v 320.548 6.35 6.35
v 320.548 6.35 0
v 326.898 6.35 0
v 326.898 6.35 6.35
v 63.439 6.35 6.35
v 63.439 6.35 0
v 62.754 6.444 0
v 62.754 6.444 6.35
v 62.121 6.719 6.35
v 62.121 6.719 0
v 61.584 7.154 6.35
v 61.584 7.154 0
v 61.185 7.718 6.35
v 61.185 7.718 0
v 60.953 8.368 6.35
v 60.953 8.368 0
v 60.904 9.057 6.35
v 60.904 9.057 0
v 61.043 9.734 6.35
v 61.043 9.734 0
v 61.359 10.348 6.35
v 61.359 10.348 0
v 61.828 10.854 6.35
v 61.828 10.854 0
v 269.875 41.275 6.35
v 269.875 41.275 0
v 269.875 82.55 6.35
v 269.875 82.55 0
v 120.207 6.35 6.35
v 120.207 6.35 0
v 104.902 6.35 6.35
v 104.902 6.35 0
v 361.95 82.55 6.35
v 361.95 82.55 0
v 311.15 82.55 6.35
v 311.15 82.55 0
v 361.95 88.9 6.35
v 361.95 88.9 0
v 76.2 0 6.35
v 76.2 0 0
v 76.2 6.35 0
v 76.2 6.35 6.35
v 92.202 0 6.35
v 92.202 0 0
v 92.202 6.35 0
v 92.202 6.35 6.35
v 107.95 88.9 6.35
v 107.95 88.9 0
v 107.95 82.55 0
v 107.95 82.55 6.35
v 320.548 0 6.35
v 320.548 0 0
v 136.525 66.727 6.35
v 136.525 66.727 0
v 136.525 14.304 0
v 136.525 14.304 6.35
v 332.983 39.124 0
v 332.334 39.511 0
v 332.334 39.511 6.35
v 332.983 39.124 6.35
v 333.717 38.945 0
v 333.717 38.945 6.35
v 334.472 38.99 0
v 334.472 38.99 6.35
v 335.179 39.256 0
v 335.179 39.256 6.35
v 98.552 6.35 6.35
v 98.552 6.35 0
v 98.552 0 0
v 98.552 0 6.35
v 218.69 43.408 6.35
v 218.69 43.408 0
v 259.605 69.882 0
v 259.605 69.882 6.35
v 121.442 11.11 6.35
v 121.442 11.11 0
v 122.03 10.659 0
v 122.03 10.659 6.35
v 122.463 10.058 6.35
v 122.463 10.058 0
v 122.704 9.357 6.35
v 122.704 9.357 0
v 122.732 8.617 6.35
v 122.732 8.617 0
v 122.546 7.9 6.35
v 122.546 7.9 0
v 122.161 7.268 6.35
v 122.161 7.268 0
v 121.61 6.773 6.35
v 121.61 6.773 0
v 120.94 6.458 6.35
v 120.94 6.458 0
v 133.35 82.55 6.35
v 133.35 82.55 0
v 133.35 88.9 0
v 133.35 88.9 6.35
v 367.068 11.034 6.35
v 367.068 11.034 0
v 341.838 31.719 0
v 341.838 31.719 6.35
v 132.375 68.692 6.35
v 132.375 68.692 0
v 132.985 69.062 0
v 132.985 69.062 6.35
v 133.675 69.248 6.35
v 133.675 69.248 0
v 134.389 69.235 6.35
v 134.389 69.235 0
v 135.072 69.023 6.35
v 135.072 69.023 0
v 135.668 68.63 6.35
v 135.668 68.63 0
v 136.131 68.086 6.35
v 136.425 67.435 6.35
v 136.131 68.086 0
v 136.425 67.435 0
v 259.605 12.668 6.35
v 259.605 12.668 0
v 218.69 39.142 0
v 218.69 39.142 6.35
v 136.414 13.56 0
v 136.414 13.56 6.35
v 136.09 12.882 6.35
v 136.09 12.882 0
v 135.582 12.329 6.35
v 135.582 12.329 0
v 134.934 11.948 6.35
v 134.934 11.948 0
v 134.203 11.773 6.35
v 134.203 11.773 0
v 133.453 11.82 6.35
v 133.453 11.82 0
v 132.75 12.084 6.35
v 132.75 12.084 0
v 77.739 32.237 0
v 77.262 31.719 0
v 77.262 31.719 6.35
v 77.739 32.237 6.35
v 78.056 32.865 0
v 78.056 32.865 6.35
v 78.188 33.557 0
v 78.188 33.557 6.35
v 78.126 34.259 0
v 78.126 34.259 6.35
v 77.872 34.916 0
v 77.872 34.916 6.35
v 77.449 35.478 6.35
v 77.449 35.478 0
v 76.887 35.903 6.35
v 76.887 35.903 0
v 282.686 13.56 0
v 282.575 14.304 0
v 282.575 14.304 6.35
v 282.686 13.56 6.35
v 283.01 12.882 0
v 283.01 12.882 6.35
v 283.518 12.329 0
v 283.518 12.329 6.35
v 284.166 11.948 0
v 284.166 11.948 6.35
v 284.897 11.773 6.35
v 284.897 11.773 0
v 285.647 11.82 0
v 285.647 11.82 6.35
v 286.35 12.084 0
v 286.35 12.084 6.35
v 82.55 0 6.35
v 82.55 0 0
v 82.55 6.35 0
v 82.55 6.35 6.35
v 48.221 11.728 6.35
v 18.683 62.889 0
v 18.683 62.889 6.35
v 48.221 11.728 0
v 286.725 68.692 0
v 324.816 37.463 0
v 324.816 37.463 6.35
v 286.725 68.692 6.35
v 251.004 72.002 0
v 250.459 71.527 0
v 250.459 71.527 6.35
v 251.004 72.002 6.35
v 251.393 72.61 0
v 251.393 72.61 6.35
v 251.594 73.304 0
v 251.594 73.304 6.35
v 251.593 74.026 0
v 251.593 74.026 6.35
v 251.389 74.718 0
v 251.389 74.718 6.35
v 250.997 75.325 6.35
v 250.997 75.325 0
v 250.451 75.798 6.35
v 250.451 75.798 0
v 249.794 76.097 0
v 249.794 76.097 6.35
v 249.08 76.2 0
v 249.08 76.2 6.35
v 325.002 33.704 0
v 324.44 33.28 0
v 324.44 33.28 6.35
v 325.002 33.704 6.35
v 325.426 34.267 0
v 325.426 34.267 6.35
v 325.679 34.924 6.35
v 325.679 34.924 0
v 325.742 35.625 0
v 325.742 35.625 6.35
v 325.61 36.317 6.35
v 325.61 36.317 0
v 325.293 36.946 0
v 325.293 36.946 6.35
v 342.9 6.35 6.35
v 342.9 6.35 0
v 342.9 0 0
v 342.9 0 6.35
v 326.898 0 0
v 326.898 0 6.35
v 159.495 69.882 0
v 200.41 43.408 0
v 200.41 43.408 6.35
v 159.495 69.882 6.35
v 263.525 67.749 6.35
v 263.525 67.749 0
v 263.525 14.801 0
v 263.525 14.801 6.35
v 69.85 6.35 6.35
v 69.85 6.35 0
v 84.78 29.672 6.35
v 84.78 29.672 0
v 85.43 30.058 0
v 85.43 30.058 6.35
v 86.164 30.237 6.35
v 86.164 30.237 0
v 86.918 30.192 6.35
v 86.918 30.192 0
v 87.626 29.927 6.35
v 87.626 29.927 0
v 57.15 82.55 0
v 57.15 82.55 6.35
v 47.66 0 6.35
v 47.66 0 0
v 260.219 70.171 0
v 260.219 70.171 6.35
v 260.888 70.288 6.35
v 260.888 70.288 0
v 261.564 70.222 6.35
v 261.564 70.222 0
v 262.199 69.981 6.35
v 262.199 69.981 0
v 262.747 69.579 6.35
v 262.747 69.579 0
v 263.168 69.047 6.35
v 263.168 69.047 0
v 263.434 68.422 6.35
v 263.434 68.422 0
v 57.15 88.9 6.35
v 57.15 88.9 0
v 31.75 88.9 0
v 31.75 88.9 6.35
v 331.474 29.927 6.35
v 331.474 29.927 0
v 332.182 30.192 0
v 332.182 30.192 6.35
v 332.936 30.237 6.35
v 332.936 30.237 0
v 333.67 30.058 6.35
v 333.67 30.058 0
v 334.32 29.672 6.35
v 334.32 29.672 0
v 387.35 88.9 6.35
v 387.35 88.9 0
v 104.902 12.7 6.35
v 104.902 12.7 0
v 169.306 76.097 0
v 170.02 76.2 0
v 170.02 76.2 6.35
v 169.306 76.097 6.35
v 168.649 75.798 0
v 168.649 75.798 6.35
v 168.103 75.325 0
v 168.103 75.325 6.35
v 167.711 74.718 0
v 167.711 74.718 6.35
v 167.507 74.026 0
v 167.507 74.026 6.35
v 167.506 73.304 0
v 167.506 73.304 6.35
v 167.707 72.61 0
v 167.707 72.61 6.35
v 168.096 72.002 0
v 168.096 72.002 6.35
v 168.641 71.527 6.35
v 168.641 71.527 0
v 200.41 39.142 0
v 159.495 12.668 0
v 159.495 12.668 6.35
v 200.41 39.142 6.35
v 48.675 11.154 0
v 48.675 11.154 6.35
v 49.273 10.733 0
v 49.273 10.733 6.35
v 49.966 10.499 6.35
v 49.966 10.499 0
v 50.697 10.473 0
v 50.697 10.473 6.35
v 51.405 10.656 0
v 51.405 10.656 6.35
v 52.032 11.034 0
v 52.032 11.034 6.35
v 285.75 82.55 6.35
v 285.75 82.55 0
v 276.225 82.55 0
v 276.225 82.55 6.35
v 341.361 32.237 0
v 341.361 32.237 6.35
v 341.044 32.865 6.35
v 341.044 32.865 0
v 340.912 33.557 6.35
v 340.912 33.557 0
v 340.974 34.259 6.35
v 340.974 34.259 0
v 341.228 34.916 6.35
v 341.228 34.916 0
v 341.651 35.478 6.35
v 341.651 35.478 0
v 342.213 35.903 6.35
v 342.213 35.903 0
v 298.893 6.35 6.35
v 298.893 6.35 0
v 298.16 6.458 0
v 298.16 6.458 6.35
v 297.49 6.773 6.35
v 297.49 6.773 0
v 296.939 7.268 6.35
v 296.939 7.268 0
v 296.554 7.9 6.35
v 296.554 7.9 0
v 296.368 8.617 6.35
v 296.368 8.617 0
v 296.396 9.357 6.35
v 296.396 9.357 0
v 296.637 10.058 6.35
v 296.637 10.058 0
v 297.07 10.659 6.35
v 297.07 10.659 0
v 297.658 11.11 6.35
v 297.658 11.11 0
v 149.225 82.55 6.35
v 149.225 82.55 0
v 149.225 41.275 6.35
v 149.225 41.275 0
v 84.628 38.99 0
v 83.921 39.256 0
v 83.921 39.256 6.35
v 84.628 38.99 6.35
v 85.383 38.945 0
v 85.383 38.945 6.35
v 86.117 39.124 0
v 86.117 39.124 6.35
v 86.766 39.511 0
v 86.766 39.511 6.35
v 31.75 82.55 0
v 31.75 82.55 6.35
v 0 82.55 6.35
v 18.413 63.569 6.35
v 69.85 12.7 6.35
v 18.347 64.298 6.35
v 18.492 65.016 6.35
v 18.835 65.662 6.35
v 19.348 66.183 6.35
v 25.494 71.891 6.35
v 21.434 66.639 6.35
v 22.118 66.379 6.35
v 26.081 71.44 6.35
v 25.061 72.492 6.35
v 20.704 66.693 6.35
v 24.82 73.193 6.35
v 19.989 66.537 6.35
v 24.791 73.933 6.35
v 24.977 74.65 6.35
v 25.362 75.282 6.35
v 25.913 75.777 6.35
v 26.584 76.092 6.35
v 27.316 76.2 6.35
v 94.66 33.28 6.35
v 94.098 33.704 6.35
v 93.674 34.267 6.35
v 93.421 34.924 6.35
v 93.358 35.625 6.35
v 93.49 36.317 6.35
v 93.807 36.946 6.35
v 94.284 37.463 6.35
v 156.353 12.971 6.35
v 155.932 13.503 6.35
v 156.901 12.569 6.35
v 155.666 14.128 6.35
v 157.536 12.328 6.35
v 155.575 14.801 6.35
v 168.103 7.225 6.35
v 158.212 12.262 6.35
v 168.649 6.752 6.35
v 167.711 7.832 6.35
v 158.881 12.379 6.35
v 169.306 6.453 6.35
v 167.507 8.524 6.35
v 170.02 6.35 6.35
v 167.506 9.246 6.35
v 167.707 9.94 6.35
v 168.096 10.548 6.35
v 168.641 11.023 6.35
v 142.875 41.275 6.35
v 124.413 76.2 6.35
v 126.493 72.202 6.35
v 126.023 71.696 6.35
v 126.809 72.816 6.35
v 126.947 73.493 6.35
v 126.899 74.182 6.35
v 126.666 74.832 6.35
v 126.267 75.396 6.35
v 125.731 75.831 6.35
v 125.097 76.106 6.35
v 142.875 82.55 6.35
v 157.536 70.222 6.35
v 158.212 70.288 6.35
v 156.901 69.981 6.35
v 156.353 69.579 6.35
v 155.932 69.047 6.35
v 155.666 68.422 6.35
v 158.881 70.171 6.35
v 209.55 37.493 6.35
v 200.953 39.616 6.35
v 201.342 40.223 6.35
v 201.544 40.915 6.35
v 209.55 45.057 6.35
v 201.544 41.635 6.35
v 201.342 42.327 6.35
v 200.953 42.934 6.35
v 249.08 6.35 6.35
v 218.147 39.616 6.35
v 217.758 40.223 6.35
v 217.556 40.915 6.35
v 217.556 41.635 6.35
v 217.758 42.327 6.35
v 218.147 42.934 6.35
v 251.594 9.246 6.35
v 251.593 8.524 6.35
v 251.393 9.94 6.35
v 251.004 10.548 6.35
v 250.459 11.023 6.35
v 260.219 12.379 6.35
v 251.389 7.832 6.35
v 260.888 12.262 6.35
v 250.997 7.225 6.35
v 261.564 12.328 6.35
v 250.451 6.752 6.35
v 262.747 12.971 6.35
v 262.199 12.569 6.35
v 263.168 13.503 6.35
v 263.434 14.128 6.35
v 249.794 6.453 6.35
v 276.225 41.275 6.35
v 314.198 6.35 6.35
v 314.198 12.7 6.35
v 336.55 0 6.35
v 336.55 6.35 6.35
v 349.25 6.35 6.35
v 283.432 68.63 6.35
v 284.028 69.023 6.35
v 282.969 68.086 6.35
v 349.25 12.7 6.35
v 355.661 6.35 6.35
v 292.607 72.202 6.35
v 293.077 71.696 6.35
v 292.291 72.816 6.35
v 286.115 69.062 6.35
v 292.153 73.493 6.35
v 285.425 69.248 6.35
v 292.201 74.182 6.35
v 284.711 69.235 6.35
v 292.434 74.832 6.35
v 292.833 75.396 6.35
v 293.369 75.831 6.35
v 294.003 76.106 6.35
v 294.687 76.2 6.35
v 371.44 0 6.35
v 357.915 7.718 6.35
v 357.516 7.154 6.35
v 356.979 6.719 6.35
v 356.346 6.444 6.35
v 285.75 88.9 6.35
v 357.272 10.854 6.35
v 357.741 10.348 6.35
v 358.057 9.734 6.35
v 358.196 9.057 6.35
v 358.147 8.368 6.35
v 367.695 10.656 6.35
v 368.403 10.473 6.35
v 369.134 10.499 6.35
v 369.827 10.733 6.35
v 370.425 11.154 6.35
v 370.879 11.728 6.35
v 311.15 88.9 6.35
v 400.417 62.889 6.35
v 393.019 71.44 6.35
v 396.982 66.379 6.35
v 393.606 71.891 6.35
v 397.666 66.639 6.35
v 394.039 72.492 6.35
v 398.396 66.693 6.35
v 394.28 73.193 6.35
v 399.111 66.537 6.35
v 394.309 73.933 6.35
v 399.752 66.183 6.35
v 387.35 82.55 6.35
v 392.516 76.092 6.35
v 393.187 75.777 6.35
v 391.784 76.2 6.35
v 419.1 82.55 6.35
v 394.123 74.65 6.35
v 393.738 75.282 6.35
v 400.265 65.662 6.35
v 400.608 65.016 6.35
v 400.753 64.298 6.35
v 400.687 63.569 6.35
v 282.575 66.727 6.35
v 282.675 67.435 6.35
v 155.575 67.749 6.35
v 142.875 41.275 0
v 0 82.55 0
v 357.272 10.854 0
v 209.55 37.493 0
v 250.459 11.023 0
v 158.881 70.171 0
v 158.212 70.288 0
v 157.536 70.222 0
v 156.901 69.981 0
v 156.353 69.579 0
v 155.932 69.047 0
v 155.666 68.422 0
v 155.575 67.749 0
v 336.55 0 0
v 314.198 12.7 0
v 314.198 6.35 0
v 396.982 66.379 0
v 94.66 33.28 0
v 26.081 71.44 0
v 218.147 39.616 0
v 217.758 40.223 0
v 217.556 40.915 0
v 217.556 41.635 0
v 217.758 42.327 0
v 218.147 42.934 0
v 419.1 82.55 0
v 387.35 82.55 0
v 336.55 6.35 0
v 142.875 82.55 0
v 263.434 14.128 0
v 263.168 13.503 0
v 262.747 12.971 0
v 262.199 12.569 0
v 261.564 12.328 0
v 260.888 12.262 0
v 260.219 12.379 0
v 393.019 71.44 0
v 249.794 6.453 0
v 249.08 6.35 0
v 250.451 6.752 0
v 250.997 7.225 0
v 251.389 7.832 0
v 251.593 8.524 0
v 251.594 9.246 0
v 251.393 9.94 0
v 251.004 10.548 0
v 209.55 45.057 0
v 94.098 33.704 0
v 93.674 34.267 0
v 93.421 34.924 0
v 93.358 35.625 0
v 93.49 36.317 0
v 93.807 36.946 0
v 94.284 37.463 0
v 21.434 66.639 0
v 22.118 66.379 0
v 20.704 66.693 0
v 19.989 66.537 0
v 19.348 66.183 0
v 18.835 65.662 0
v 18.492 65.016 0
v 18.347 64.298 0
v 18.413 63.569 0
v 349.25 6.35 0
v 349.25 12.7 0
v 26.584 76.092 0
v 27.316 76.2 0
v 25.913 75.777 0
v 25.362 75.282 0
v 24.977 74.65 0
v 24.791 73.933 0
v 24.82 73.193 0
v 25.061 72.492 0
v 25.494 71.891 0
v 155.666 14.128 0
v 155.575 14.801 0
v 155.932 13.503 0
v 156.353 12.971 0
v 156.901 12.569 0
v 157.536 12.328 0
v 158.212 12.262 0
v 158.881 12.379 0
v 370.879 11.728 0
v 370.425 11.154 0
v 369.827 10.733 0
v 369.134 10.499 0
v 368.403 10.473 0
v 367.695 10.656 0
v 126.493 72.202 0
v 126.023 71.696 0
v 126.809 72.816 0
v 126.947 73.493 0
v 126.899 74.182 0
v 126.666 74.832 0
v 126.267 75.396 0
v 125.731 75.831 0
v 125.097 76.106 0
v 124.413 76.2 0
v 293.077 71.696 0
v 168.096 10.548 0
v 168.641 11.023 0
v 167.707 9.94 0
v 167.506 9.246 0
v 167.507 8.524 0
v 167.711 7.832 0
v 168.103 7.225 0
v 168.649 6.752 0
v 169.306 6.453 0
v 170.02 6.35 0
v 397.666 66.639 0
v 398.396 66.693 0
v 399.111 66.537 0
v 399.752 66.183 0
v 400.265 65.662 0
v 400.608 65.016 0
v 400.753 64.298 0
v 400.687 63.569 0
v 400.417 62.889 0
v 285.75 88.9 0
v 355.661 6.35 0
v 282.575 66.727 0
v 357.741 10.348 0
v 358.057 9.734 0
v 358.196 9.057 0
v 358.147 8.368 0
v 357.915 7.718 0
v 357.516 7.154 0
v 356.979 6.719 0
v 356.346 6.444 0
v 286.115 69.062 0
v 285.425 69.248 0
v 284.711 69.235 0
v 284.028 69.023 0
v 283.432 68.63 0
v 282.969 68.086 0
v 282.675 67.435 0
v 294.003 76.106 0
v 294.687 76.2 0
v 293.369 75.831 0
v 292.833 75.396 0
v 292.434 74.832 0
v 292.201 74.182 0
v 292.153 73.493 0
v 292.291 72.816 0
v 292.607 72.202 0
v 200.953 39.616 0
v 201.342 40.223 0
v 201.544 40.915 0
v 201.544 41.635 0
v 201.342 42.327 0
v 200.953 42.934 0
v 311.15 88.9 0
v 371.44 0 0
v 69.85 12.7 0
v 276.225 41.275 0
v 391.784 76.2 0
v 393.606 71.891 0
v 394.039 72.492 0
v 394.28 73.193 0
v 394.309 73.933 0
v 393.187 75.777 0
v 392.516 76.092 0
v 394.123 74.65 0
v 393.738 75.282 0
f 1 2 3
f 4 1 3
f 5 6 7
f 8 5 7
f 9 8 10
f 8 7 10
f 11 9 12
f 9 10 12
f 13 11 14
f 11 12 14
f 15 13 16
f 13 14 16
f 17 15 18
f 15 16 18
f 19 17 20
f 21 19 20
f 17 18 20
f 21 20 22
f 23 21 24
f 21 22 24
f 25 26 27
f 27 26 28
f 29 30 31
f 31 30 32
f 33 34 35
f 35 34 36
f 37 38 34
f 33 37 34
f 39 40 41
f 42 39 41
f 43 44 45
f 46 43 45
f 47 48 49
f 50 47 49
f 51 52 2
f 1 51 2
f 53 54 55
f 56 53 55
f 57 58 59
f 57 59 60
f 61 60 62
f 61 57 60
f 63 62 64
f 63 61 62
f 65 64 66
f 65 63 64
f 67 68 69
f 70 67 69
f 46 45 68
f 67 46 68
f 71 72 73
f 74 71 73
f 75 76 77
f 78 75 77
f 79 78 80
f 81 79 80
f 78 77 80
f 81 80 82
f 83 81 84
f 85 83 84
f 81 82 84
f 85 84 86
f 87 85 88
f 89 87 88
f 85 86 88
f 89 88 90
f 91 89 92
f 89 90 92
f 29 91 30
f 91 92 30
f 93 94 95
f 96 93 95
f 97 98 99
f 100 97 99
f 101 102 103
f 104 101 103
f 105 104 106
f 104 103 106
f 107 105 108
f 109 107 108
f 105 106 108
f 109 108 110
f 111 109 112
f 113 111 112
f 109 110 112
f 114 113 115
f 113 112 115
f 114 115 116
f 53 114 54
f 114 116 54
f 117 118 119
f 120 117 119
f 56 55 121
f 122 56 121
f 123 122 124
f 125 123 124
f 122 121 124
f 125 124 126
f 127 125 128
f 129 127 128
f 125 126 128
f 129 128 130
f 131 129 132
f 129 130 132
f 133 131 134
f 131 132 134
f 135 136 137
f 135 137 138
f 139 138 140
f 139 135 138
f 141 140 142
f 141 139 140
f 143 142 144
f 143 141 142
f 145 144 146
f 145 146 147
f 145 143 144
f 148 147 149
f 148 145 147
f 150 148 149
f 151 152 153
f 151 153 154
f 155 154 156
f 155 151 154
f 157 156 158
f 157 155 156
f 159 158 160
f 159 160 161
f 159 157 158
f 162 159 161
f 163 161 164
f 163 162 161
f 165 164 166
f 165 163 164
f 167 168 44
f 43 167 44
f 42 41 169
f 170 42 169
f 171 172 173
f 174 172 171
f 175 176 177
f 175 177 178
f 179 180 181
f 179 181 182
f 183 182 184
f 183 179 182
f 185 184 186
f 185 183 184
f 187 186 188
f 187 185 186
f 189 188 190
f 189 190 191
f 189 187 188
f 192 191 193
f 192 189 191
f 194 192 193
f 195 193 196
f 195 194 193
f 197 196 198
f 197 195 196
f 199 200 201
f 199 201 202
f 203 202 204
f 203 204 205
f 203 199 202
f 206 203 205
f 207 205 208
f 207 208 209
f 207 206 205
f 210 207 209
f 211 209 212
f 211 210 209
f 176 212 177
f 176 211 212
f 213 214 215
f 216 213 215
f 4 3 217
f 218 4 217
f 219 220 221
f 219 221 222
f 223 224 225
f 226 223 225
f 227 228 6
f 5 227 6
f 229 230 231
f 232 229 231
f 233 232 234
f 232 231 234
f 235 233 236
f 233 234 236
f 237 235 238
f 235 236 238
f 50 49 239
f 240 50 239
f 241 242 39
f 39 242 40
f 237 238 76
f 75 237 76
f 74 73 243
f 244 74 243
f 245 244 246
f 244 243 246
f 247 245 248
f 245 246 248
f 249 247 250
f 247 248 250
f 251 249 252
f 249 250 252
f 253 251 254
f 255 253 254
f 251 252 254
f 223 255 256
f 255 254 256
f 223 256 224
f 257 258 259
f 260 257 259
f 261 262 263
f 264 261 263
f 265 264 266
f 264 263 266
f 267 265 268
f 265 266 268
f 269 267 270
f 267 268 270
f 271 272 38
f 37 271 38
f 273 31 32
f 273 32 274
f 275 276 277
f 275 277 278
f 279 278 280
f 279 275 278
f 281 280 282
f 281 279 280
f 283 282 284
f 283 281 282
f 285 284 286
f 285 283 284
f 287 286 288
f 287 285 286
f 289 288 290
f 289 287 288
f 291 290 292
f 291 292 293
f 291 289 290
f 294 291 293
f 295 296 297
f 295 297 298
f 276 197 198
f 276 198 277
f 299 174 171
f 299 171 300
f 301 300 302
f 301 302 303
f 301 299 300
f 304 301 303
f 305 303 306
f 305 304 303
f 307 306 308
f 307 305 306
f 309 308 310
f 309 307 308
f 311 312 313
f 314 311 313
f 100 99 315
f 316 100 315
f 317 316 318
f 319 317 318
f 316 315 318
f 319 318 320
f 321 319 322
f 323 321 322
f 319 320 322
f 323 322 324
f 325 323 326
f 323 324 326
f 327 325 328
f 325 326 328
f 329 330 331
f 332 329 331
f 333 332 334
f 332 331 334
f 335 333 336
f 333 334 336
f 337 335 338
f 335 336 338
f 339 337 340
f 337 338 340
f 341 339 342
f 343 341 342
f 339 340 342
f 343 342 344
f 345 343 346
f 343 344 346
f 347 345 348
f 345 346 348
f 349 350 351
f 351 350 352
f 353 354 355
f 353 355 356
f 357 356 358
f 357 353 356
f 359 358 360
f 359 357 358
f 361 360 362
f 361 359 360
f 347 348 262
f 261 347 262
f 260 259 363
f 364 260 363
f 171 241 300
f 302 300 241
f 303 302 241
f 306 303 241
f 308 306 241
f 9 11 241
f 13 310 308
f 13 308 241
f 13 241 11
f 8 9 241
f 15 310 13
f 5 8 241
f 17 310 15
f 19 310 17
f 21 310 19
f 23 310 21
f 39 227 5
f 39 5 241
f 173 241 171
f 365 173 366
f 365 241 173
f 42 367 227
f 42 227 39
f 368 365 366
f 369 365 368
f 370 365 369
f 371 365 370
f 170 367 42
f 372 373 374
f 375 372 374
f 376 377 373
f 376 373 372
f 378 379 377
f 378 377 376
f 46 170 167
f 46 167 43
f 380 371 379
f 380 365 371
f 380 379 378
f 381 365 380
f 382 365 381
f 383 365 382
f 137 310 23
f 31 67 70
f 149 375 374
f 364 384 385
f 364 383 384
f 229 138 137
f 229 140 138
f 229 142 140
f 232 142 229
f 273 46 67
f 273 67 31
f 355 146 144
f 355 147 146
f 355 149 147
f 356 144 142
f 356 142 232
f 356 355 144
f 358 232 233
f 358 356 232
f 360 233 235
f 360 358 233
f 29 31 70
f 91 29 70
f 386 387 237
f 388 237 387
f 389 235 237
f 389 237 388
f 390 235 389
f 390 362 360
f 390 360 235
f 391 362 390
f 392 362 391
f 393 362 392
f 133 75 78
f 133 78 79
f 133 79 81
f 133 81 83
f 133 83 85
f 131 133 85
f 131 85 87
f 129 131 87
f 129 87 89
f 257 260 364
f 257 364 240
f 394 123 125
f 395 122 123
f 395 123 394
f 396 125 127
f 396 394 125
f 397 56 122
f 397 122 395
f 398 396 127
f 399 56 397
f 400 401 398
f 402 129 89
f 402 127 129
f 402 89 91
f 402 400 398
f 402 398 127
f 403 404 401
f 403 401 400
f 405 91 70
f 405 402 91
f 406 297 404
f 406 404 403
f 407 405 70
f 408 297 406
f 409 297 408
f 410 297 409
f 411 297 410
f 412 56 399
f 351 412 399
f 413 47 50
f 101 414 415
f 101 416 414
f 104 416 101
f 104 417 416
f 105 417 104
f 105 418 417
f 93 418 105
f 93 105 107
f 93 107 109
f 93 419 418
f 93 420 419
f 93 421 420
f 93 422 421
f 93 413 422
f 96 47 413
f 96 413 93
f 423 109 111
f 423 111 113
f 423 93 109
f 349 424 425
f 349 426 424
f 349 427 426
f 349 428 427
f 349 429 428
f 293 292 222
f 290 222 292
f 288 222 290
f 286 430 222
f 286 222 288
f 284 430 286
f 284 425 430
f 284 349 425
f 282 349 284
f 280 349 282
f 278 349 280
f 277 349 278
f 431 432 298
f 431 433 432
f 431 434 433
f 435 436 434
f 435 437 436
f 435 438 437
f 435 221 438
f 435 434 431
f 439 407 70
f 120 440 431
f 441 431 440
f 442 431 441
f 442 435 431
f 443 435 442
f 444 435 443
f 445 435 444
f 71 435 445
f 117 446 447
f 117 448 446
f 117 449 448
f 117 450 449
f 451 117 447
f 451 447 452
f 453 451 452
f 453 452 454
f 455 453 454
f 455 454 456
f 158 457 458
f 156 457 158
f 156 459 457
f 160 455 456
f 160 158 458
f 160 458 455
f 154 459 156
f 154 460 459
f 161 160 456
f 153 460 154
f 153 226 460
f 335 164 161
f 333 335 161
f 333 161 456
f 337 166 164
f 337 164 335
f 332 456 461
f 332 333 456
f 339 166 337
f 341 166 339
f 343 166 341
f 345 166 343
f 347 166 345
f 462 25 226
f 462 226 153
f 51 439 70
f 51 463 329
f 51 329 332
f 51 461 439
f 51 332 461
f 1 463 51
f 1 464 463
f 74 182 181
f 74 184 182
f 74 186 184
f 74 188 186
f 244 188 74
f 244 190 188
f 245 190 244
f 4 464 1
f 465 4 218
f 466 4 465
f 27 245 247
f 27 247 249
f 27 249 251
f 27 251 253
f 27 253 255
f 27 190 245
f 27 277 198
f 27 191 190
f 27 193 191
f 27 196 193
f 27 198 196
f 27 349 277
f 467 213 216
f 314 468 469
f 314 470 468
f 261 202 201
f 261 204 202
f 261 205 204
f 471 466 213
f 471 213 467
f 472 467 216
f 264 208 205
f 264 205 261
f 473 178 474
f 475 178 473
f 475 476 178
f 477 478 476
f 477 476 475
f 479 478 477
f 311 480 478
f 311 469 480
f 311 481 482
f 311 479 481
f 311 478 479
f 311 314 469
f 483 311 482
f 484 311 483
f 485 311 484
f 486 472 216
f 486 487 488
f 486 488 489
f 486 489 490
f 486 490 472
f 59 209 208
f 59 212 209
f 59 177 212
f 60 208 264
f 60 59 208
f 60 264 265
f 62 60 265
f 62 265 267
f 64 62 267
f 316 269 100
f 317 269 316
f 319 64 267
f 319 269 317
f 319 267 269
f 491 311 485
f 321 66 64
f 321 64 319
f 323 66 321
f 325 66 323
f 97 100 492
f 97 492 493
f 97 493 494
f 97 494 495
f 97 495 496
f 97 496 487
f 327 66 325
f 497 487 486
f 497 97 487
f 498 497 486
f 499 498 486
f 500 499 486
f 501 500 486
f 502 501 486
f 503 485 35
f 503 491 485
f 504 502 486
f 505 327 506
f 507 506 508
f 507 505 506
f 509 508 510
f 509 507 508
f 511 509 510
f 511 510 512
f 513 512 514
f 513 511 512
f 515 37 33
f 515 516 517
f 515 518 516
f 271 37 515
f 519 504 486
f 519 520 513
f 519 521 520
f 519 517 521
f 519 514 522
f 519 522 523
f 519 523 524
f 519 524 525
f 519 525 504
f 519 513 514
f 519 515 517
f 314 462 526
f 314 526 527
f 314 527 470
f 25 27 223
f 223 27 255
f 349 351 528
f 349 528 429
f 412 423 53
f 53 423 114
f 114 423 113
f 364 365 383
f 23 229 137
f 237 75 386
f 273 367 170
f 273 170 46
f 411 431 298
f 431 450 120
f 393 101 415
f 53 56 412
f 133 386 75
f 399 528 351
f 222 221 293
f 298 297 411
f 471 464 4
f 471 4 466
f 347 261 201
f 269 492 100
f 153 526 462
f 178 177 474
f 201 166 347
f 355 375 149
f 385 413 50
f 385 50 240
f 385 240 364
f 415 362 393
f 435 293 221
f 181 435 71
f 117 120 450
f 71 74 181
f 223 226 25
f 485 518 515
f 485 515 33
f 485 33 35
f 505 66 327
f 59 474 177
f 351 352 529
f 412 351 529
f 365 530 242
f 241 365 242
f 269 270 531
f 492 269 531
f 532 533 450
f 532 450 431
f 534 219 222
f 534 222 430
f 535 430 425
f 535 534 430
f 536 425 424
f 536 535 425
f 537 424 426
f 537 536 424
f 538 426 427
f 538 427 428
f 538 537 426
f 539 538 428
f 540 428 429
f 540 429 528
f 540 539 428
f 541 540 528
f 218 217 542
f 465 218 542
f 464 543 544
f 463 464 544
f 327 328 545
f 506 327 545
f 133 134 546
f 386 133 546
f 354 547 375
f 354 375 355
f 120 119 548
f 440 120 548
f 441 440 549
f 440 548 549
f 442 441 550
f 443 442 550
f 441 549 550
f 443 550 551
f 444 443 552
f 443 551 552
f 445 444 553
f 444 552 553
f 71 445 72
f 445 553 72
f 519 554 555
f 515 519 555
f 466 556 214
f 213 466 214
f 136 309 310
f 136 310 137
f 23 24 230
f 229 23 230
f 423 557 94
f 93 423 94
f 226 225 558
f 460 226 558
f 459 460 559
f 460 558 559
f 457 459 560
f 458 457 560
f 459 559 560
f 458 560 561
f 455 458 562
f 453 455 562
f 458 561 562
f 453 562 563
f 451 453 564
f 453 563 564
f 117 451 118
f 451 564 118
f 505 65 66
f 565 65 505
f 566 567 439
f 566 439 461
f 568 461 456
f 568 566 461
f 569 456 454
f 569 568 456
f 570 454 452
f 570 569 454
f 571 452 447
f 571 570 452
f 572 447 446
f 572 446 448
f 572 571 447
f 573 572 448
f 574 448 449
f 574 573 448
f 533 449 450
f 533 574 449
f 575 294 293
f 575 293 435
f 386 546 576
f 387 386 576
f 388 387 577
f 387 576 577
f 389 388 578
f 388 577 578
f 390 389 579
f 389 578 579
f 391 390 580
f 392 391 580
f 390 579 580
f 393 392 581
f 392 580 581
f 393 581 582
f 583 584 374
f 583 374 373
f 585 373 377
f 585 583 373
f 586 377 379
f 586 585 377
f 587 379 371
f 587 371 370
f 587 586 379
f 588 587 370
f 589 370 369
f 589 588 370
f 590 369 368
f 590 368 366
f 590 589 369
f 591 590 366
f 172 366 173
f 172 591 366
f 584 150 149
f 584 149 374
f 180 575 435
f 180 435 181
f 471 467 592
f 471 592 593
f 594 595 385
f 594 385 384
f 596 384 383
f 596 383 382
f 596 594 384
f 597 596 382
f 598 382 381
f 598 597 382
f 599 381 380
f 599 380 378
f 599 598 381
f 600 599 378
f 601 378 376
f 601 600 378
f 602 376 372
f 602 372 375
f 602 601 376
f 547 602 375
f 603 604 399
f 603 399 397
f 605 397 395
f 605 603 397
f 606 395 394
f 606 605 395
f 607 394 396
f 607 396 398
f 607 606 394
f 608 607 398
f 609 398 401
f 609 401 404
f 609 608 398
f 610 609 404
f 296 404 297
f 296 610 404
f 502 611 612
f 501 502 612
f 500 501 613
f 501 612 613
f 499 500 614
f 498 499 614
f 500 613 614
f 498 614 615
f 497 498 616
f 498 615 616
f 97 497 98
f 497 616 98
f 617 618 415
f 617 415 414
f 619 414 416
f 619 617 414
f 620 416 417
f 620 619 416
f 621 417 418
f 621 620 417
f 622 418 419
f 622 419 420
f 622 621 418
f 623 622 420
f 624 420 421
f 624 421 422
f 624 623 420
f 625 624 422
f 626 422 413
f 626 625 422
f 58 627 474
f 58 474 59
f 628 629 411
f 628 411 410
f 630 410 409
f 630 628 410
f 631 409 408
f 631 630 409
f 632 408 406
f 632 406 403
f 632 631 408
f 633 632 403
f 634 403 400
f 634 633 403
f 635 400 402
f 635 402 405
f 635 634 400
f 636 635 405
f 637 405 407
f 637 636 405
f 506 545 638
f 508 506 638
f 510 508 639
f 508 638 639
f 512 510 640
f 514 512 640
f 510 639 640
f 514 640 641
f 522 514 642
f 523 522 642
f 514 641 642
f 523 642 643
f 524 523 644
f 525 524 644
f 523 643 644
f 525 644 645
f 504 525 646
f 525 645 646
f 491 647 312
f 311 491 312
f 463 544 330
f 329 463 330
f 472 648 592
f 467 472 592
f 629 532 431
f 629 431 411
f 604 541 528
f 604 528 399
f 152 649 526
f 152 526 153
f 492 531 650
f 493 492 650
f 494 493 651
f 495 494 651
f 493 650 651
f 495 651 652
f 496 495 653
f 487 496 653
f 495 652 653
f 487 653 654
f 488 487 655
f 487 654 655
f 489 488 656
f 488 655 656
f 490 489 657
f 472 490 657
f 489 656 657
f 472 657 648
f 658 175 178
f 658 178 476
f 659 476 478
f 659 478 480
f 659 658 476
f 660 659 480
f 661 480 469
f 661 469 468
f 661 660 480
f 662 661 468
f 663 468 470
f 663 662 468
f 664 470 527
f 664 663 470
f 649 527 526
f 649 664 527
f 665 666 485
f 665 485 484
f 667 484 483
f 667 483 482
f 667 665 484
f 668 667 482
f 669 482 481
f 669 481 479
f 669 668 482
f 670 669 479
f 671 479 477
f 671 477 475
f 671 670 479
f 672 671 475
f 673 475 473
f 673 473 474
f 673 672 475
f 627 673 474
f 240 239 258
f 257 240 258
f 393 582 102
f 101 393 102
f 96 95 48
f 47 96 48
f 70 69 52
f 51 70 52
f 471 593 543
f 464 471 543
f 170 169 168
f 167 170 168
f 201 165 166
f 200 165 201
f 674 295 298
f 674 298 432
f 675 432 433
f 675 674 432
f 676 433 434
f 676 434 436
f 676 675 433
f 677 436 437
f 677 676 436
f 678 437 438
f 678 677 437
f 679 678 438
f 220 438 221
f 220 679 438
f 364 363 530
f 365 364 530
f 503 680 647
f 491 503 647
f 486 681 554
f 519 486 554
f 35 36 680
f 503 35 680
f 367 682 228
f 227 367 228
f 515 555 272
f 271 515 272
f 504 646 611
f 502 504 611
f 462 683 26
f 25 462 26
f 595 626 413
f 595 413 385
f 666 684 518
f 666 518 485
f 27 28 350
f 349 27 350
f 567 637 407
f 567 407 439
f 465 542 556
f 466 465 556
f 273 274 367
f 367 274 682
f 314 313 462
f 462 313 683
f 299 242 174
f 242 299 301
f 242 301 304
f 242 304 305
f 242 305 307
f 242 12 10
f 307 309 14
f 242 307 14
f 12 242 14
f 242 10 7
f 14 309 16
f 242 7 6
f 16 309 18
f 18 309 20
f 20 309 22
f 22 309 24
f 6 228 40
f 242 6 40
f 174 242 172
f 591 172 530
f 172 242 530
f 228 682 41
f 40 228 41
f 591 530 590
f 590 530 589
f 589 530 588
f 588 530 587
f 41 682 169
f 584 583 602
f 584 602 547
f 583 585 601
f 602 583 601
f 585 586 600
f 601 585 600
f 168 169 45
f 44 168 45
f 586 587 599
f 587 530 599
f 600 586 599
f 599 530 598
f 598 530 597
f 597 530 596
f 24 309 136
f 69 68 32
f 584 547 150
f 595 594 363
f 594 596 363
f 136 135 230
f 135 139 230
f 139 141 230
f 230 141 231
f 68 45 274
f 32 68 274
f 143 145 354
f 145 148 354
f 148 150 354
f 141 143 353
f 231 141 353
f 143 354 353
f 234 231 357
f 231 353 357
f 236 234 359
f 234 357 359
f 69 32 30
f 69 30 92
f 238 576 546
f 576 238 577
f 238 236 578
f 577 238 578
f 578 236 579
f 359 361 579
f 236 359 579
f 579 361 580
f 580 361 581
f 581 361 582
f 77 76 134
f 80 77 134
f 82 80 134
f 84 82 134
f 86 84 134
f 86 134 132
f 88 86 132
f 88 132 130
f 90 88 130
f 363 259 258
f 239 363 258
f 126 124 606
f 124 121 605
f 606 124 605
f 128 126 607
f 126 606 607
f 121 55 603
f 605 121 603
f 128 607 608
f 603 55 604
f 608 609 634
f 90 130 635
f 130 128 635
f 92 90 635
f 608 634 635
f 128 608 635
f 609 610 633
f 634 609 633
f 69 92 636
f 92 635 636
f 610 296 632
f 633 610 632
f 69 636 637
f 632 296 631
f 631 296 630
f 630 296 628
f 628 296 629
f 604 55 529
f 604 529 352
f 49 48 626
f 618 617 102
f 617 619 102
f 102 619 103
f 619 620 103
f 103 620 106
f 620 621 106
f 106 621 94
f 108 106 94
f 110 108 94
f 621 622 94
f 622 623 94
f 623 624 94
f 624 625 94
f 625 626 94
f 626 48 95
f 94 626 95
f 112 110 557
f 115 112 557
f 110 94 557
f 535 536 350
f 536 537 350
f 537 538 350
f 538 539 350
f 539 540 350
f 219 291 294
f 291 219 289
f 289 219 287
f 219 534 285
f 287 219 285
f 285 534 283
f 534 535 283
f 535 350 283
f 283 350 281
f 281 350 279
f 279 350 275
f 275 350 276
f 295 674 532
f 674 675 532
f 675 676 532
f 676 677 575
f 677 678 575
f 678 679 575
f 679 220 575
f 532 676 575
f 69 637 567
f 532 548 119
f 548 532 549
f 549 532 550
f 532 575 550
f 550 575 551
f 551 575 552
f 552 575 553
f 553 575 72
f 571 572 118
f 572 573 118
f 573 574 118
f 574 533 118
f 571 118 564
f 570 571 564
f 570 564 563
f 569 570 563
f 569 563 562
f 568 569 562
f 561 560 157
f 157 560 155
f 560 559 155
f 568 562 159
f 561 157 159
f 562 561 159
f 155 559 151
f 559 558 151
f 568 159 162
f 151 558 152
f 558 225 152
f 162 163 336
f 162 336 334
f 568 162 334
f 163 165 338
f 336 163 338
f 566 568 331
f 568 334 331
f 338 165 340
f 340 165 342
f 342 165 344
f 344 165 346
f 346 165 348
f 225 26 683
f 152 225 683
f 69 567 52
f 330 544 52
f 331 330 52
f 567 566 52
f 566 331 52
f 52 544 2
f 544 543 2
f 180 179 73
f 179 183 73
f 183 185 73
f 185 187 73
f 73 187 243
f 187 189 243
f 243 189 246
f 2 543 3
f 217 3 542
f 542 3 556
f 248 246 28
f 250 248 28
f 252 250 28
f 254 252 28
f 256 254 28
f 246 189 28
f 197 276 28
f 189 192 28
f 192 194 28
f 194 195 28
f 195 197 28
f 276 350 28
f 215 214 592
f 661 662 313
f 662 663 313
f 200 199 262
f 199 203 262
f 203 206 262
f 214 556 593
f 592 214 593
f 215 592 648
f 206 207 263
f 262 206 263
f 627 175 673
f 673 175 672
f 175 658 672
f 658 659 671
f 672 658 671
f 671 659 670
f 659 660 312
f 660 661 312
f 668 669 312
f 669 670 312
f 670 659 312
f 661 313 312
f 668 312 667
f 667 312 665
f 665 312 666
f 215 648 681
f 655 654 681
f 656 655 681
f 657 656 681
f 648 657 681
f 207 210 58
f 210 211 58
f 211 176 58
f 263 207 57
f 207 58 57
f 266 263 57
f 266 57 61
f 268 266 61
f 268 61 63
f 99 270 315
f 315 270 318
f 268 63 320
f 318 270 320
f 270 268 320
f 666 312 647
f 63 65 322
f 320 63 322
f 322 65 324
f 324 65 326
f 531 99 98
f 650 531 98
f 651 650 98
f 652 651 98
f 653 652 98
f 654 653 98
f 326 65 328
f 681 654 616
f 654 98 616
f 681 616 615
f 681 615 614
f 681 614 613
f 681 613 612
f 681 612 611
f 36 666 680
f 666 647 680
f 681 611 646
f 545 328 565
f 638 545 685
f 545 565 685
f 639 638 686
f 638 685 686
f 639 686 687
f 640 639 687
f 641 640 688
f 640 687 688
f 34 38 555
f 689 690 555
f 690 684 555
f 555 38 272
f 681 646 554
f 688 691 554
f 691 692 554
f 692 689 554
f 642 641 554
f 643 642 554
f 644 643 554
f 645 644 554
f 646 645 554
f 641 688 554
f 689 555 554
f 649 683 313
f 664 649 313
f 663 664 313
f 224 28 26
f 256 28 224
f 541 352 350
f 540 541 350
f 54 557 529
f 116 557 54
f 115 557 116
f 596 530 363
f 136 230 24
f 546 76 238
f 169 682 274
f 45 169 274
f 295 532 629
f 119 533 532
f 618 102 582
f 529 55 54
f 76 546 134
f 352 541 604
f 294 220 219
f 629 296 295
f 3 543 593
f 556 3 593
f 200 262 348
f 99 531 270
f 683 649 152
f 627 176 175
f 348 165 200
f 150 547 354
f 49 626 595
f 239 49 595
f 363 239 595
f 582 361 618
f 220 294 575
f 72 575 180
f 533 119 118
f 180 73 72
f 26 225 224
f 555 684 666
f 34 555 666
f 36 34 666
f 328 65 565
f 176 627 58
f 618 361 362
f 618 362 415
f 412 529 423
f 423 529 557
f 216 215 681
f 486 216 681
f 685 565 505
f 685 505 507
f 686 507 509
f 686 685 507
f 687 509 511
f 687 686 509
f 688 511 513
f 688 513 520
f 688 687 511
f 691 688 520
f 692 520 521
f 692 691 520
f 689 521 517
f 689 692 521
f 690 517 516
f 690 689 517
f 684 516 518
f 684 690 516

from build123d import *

# Parameters (mm, degrees)
EXTRUDE2_DEPTH = 6.35


with BuildPart() as part:
    # Sketch1 → Extrude2 (new body)
    with BuildSketch(Plane.XY):
        Polygon((47.660264722, 0), (76.2, 0), (76.2, 6.35), (82.55, 6.35), (82.55, 0), (92.202, 0), (92.202, 6.35), (98.552, 6.35), (98.552, 0), (320.548, 0), (320.548, 6.35), (326.898, 6.35), (326.898, 0), (336.55, 0), (336.55, 6.35), (342.9, 6.35), (342.9, 0), (371.439735278, 0), (419.1, 82.55), (387.35, 82.55), (387.35, 88.9), (361.95, 88.9), (361.95, 82.55), (311.15, 82.55), (311.15, 88.9), (285.75, 88.9), (285.75, 82.55), (276.225, 82.55), (276.225, 41.275), (269.875, 41.275), (269.875, 82.55), (149.225, 82.55), (149.225, 41.275), (142.875, 41.275), (142.875, 82.55), (133.35, 82.55), (133.35, 88.9), (107.95, 88.9), (107.95, 82.55), (57.15, 82.55), (57.15, 88.9), (31.75, 88.9), (31.75, 82.55), (0, 82.55), align=None)
        with BuildLine():
            Line((155.575, 67.749415869), (155.575, 14.800584131))
            ThreePointArc((155.575, 14.800584131), (156.901171335, 12.56939163), (159.494858247, 12.668075931))
            Line((159.494858247, 12.668075931), (200.40986459, 39.142491801))
            ThreePointArc((200.40986459, 39.142491801), (201.570006344, 41.275), (200.40986459, 43.407508199))
            Line((200.40986459, 43.407508199), (159.494858247, 69.881924069))
            ThreePointArc((159.494858247, 69.881924069), (156.901171335, 69.98060837), (155.575, 67.749415869))
        make_face(mode=Mode.SUBTRACT)
        with BuildLine():
            Line((170.020448202, 6.35), (249.079551798, 6.35))
            ThreePointArc((249.079551798, 6.35), (251.515549625, 8.170615133), (250.459410045, 11.022508199))
            Line((250.459410045, 11.022508199), (209.55, 37.493302934))
            Line((209.55, 37.493302934), (168.640589955, 11.022508199))
            ThreePointArc((168.640589955, 11.022508199), (167.584450375, 8.170615133), (170.020448202, 6.35))
        make_face(mode=Mode.SUBTRACT)
        with BuildLine():
            Line((52.031551003, 11.033734326), (77.262001053, 31.718906867))
            ThreePointArc((77.262001053, 31.718906867), (78.181456091, 33.910104112), (76.886676101, 35.902662194))
            Line((76.886676101, 35.902662194), (22.118136541, 66.378961445))
            ThreePointArc((22.118136541, 66.378961445), (19.07288135, 65.941246674), (18.683371551, 62.889451217))
            Line((18.683371551, 62.889451217), (48.221461062, 11.727979426))
            ThreePointArc((48.221461062, 11.727979426), (49.965843374, 10.499123351), (52.031551003, 11.033734326))
        make_face(mode=Mode.SUBTRACT)
        with BuildLine():
            Line((61.828236325, 10.8542451), (84.780365617, 29.671537445))
            ThreePointArc((84.780365617, 29.671537445), (86.163798888, 30.2371328), (87.625811497, 29.926802573))
            Line((87.625811497, 29.926802573), (121.442109591, 11.109510228))
            ThreePointArc((121.442109591, 11.109510228), (122.665621474, 8.252017233), (120.207049127, 6.35))
            Line((120.207049127, 6.35), (104.902, 6.35))
            Line((104.902, 6.35), (104.902, 12.7))
            Line((104.902, 12.7), (69.85, 12.7))
            Line((69.85, 12.7), (69.85, 6.35))
            Line((69.85, 6.35), (63.438621741, 6.35))
            ThreePointArc((63.438621741, 6.35), (61.046887793, 8.034892566), (61.828236325, 10.8542451))
        make_face(mode=Mode.SUBTRACT)
        with BuildLine():
            Line((26.081413037, 71.440489772), (83.920586204, 39.255517086))
            ThreePointArc((83.920586204, 39.255517086), (85.382598814, 38.945186859), (86.766032084, 39.510782213))
            Line((86.766032084, 39.510782213), (126.023202606, 71.6957549))
            ThreePointArc((126.023202606, 71.6957549), (126.804551138, 74.515107434), (124.41281719, 76.2))
            Line((124.41281719, 76.2), (27.316473501, 76.2))
            ThreePointArc((27.316473501, 76.2), (24.857901154, 74.297982767), (26.081413037, 71.440489772))
        make_face(mode=Mode.SUBTRACT)
        with BuildLine():
            Line((94.284396649, 37.463412792), (132.374614584, 68.691659953))
            ThreePointArc((132.374614584, 68.691659953), (135.071559028, 69.023278411), (136.525, 66.727414853))
            Line((136.525, 66.727414853), (136.525, 14.303625696))
            ThreePointArc((136.525, 14.303625696), (135.272351238, 12.114030576), (132.749939536, 12.084115469))
            Line((132.749939536, 12.084115469), (94.659721601, 33.279657465))
            ThreePointArc((94.659721601, 33.279657465), (93.364941611, 35.272215547), (94.284396649, 37.463412792))
        make_face(mode=Mode.SUBTRACT)
        with BuildLine():
            Line((168.640589955, 71.527491801), (209.55, 45.056697066))
            Line((209.55, 45.056697066), (250.459410045, 71.527491801))
            ThreePointArc((250.459410045, 71.527491801), (251.515549625, 74.379384867), (249.079551798, 76.2))
            Line((249.079551798, 76.2), (170.020448202, 76.2))
            ThreePointArc((170.020448202, 76.2), (167.584450375, 74.379384867), (168.640589955, 71.527491801))
        make_face(mode=Mode.SUBTRACT)
        with BuildLine():
            Line((282.575, 66.727414853), (282.575, 14.303625696))
            ThreePointArc((282.575, 14.303625696), (283.827648762, 12.114030576), (286.350060464, 12.084115469))
            Line((286.350060464, 12.084115469), (324.440278399, 33.279657465))
            ThreePointArc((324.440278399, 33.279657465), (325.735058389, 35.272215547), (324.815603351, 37.463412792))
            Line((324.815603351, 37.463412792), (286.725385416, 68.691659953))
            ThreePointArc((286.725385416, 68.691659953), (284.028440972, 69.023278411), (282.575, 66.727414853))
        make_face(mode=Mode.SUBTRACT)
        with BuildLine():
            Line((391.783526499, 76.2), (294.68718281, 76.2))
            ThreePointArc((294.68718281, 76.2), (292.295448862, 74.515107434), (293.076797394, 71.6957549))
            Line((293.076797394, 71.6957549), (332.333967916, 39.510782213))
            ThreePointArc((332.333967916, 39.510782213), (333.717401186, 38.945186859), (335.179413796, 39.255517086))
            Line((335.179413796, 39.255517086), (393.018586963, 71.440489772))
            ThreePointArc((393.018586963, 71.440489772), (394.242098846, 74.297982767), (391.783526499, 76.2))
        make_face(mode=Mode.SUBTRACT)
        with BuildLine():
            Line((314.198, 12.7), (314.198, 6.35))
            Line((314.198, 6.35), (298.892950873, 6.35))
            ThreePointArc((298.892950873, 6.35), (296.434378526, 8.252017233), (297.657890409, 11.109510228))
            Line((297.657890409, 11.109510228), (331.474188503, 29.926802573))
            ThreePointArc((331.474188503, 29.926802573), (332.936201112, 30.2371328), (334.319634383, 29.671537445))
            Line((334.319634383, 29.671537445), (357.271763675, 10.8542451))
            ThreePointArc((357.271763675, 10.8542451), (358.053112207, 8.034892566), (355.661378259, 6.35))
            Line((355.661378259, 6.35), (349.25, 6.35))
            Line((349.25, 6.35), (349.25, 12.7))
            Line((349.25, 12.7), (314.198, 12.7))
        make_face(mode=Mode.SUBTRACT)
        with BuildLine():
            Line((400.416628449, 62.889451217), (370.878538938, 11.727979426))
            ThreePointArc((370.878538938, 11.727979426), (369.134156626, 10.499123351), (367.068448997, 11.033734326))
            Line((367.068448997, 11.033734326), (341.837998947, 31.718906867))
            ThreePointArc((341.837998947, 31.718906867), (340.918543909, 33.910104112), (342.213323899, 35.902662194))
            Line((342.213323899, 35.902662194), (396.981863459, 66.378961445))
            ThreePointArc((396.981863459, 66.378961445), (400.02711865, 65.941246674), (400.416628449, 62.889451217))
        make_face(mode=Mode.SUBTRACT)
        with BuildLine():
            Line((259.605141753, 12.668075931), (218.69013541, 39.142491801))
            ThreePointArc((218.69013541, 39.142491801), (217.529993656, 41.275), (218.69013541, 43.407508199))
            Line((218.69013541, 43.407508199), (259.605141753, 69.881924069))
            ThreePointArc((259.605141753, 69.881924069), (262.198828665, 69.98060837), (263.525, 67.749415869))
            Line((263.525, 67.749415869), (263.525, 14.800584131))
            ThreePointArc((263.525, 14.800584131), (262.198828665, 12.56939163), (259.605141753, 12.668075931))
        make_face(mode=Mode.SUBTRACT)
    extrude(amount=EXTRUDE2_DEPTH)


solid = part.part
